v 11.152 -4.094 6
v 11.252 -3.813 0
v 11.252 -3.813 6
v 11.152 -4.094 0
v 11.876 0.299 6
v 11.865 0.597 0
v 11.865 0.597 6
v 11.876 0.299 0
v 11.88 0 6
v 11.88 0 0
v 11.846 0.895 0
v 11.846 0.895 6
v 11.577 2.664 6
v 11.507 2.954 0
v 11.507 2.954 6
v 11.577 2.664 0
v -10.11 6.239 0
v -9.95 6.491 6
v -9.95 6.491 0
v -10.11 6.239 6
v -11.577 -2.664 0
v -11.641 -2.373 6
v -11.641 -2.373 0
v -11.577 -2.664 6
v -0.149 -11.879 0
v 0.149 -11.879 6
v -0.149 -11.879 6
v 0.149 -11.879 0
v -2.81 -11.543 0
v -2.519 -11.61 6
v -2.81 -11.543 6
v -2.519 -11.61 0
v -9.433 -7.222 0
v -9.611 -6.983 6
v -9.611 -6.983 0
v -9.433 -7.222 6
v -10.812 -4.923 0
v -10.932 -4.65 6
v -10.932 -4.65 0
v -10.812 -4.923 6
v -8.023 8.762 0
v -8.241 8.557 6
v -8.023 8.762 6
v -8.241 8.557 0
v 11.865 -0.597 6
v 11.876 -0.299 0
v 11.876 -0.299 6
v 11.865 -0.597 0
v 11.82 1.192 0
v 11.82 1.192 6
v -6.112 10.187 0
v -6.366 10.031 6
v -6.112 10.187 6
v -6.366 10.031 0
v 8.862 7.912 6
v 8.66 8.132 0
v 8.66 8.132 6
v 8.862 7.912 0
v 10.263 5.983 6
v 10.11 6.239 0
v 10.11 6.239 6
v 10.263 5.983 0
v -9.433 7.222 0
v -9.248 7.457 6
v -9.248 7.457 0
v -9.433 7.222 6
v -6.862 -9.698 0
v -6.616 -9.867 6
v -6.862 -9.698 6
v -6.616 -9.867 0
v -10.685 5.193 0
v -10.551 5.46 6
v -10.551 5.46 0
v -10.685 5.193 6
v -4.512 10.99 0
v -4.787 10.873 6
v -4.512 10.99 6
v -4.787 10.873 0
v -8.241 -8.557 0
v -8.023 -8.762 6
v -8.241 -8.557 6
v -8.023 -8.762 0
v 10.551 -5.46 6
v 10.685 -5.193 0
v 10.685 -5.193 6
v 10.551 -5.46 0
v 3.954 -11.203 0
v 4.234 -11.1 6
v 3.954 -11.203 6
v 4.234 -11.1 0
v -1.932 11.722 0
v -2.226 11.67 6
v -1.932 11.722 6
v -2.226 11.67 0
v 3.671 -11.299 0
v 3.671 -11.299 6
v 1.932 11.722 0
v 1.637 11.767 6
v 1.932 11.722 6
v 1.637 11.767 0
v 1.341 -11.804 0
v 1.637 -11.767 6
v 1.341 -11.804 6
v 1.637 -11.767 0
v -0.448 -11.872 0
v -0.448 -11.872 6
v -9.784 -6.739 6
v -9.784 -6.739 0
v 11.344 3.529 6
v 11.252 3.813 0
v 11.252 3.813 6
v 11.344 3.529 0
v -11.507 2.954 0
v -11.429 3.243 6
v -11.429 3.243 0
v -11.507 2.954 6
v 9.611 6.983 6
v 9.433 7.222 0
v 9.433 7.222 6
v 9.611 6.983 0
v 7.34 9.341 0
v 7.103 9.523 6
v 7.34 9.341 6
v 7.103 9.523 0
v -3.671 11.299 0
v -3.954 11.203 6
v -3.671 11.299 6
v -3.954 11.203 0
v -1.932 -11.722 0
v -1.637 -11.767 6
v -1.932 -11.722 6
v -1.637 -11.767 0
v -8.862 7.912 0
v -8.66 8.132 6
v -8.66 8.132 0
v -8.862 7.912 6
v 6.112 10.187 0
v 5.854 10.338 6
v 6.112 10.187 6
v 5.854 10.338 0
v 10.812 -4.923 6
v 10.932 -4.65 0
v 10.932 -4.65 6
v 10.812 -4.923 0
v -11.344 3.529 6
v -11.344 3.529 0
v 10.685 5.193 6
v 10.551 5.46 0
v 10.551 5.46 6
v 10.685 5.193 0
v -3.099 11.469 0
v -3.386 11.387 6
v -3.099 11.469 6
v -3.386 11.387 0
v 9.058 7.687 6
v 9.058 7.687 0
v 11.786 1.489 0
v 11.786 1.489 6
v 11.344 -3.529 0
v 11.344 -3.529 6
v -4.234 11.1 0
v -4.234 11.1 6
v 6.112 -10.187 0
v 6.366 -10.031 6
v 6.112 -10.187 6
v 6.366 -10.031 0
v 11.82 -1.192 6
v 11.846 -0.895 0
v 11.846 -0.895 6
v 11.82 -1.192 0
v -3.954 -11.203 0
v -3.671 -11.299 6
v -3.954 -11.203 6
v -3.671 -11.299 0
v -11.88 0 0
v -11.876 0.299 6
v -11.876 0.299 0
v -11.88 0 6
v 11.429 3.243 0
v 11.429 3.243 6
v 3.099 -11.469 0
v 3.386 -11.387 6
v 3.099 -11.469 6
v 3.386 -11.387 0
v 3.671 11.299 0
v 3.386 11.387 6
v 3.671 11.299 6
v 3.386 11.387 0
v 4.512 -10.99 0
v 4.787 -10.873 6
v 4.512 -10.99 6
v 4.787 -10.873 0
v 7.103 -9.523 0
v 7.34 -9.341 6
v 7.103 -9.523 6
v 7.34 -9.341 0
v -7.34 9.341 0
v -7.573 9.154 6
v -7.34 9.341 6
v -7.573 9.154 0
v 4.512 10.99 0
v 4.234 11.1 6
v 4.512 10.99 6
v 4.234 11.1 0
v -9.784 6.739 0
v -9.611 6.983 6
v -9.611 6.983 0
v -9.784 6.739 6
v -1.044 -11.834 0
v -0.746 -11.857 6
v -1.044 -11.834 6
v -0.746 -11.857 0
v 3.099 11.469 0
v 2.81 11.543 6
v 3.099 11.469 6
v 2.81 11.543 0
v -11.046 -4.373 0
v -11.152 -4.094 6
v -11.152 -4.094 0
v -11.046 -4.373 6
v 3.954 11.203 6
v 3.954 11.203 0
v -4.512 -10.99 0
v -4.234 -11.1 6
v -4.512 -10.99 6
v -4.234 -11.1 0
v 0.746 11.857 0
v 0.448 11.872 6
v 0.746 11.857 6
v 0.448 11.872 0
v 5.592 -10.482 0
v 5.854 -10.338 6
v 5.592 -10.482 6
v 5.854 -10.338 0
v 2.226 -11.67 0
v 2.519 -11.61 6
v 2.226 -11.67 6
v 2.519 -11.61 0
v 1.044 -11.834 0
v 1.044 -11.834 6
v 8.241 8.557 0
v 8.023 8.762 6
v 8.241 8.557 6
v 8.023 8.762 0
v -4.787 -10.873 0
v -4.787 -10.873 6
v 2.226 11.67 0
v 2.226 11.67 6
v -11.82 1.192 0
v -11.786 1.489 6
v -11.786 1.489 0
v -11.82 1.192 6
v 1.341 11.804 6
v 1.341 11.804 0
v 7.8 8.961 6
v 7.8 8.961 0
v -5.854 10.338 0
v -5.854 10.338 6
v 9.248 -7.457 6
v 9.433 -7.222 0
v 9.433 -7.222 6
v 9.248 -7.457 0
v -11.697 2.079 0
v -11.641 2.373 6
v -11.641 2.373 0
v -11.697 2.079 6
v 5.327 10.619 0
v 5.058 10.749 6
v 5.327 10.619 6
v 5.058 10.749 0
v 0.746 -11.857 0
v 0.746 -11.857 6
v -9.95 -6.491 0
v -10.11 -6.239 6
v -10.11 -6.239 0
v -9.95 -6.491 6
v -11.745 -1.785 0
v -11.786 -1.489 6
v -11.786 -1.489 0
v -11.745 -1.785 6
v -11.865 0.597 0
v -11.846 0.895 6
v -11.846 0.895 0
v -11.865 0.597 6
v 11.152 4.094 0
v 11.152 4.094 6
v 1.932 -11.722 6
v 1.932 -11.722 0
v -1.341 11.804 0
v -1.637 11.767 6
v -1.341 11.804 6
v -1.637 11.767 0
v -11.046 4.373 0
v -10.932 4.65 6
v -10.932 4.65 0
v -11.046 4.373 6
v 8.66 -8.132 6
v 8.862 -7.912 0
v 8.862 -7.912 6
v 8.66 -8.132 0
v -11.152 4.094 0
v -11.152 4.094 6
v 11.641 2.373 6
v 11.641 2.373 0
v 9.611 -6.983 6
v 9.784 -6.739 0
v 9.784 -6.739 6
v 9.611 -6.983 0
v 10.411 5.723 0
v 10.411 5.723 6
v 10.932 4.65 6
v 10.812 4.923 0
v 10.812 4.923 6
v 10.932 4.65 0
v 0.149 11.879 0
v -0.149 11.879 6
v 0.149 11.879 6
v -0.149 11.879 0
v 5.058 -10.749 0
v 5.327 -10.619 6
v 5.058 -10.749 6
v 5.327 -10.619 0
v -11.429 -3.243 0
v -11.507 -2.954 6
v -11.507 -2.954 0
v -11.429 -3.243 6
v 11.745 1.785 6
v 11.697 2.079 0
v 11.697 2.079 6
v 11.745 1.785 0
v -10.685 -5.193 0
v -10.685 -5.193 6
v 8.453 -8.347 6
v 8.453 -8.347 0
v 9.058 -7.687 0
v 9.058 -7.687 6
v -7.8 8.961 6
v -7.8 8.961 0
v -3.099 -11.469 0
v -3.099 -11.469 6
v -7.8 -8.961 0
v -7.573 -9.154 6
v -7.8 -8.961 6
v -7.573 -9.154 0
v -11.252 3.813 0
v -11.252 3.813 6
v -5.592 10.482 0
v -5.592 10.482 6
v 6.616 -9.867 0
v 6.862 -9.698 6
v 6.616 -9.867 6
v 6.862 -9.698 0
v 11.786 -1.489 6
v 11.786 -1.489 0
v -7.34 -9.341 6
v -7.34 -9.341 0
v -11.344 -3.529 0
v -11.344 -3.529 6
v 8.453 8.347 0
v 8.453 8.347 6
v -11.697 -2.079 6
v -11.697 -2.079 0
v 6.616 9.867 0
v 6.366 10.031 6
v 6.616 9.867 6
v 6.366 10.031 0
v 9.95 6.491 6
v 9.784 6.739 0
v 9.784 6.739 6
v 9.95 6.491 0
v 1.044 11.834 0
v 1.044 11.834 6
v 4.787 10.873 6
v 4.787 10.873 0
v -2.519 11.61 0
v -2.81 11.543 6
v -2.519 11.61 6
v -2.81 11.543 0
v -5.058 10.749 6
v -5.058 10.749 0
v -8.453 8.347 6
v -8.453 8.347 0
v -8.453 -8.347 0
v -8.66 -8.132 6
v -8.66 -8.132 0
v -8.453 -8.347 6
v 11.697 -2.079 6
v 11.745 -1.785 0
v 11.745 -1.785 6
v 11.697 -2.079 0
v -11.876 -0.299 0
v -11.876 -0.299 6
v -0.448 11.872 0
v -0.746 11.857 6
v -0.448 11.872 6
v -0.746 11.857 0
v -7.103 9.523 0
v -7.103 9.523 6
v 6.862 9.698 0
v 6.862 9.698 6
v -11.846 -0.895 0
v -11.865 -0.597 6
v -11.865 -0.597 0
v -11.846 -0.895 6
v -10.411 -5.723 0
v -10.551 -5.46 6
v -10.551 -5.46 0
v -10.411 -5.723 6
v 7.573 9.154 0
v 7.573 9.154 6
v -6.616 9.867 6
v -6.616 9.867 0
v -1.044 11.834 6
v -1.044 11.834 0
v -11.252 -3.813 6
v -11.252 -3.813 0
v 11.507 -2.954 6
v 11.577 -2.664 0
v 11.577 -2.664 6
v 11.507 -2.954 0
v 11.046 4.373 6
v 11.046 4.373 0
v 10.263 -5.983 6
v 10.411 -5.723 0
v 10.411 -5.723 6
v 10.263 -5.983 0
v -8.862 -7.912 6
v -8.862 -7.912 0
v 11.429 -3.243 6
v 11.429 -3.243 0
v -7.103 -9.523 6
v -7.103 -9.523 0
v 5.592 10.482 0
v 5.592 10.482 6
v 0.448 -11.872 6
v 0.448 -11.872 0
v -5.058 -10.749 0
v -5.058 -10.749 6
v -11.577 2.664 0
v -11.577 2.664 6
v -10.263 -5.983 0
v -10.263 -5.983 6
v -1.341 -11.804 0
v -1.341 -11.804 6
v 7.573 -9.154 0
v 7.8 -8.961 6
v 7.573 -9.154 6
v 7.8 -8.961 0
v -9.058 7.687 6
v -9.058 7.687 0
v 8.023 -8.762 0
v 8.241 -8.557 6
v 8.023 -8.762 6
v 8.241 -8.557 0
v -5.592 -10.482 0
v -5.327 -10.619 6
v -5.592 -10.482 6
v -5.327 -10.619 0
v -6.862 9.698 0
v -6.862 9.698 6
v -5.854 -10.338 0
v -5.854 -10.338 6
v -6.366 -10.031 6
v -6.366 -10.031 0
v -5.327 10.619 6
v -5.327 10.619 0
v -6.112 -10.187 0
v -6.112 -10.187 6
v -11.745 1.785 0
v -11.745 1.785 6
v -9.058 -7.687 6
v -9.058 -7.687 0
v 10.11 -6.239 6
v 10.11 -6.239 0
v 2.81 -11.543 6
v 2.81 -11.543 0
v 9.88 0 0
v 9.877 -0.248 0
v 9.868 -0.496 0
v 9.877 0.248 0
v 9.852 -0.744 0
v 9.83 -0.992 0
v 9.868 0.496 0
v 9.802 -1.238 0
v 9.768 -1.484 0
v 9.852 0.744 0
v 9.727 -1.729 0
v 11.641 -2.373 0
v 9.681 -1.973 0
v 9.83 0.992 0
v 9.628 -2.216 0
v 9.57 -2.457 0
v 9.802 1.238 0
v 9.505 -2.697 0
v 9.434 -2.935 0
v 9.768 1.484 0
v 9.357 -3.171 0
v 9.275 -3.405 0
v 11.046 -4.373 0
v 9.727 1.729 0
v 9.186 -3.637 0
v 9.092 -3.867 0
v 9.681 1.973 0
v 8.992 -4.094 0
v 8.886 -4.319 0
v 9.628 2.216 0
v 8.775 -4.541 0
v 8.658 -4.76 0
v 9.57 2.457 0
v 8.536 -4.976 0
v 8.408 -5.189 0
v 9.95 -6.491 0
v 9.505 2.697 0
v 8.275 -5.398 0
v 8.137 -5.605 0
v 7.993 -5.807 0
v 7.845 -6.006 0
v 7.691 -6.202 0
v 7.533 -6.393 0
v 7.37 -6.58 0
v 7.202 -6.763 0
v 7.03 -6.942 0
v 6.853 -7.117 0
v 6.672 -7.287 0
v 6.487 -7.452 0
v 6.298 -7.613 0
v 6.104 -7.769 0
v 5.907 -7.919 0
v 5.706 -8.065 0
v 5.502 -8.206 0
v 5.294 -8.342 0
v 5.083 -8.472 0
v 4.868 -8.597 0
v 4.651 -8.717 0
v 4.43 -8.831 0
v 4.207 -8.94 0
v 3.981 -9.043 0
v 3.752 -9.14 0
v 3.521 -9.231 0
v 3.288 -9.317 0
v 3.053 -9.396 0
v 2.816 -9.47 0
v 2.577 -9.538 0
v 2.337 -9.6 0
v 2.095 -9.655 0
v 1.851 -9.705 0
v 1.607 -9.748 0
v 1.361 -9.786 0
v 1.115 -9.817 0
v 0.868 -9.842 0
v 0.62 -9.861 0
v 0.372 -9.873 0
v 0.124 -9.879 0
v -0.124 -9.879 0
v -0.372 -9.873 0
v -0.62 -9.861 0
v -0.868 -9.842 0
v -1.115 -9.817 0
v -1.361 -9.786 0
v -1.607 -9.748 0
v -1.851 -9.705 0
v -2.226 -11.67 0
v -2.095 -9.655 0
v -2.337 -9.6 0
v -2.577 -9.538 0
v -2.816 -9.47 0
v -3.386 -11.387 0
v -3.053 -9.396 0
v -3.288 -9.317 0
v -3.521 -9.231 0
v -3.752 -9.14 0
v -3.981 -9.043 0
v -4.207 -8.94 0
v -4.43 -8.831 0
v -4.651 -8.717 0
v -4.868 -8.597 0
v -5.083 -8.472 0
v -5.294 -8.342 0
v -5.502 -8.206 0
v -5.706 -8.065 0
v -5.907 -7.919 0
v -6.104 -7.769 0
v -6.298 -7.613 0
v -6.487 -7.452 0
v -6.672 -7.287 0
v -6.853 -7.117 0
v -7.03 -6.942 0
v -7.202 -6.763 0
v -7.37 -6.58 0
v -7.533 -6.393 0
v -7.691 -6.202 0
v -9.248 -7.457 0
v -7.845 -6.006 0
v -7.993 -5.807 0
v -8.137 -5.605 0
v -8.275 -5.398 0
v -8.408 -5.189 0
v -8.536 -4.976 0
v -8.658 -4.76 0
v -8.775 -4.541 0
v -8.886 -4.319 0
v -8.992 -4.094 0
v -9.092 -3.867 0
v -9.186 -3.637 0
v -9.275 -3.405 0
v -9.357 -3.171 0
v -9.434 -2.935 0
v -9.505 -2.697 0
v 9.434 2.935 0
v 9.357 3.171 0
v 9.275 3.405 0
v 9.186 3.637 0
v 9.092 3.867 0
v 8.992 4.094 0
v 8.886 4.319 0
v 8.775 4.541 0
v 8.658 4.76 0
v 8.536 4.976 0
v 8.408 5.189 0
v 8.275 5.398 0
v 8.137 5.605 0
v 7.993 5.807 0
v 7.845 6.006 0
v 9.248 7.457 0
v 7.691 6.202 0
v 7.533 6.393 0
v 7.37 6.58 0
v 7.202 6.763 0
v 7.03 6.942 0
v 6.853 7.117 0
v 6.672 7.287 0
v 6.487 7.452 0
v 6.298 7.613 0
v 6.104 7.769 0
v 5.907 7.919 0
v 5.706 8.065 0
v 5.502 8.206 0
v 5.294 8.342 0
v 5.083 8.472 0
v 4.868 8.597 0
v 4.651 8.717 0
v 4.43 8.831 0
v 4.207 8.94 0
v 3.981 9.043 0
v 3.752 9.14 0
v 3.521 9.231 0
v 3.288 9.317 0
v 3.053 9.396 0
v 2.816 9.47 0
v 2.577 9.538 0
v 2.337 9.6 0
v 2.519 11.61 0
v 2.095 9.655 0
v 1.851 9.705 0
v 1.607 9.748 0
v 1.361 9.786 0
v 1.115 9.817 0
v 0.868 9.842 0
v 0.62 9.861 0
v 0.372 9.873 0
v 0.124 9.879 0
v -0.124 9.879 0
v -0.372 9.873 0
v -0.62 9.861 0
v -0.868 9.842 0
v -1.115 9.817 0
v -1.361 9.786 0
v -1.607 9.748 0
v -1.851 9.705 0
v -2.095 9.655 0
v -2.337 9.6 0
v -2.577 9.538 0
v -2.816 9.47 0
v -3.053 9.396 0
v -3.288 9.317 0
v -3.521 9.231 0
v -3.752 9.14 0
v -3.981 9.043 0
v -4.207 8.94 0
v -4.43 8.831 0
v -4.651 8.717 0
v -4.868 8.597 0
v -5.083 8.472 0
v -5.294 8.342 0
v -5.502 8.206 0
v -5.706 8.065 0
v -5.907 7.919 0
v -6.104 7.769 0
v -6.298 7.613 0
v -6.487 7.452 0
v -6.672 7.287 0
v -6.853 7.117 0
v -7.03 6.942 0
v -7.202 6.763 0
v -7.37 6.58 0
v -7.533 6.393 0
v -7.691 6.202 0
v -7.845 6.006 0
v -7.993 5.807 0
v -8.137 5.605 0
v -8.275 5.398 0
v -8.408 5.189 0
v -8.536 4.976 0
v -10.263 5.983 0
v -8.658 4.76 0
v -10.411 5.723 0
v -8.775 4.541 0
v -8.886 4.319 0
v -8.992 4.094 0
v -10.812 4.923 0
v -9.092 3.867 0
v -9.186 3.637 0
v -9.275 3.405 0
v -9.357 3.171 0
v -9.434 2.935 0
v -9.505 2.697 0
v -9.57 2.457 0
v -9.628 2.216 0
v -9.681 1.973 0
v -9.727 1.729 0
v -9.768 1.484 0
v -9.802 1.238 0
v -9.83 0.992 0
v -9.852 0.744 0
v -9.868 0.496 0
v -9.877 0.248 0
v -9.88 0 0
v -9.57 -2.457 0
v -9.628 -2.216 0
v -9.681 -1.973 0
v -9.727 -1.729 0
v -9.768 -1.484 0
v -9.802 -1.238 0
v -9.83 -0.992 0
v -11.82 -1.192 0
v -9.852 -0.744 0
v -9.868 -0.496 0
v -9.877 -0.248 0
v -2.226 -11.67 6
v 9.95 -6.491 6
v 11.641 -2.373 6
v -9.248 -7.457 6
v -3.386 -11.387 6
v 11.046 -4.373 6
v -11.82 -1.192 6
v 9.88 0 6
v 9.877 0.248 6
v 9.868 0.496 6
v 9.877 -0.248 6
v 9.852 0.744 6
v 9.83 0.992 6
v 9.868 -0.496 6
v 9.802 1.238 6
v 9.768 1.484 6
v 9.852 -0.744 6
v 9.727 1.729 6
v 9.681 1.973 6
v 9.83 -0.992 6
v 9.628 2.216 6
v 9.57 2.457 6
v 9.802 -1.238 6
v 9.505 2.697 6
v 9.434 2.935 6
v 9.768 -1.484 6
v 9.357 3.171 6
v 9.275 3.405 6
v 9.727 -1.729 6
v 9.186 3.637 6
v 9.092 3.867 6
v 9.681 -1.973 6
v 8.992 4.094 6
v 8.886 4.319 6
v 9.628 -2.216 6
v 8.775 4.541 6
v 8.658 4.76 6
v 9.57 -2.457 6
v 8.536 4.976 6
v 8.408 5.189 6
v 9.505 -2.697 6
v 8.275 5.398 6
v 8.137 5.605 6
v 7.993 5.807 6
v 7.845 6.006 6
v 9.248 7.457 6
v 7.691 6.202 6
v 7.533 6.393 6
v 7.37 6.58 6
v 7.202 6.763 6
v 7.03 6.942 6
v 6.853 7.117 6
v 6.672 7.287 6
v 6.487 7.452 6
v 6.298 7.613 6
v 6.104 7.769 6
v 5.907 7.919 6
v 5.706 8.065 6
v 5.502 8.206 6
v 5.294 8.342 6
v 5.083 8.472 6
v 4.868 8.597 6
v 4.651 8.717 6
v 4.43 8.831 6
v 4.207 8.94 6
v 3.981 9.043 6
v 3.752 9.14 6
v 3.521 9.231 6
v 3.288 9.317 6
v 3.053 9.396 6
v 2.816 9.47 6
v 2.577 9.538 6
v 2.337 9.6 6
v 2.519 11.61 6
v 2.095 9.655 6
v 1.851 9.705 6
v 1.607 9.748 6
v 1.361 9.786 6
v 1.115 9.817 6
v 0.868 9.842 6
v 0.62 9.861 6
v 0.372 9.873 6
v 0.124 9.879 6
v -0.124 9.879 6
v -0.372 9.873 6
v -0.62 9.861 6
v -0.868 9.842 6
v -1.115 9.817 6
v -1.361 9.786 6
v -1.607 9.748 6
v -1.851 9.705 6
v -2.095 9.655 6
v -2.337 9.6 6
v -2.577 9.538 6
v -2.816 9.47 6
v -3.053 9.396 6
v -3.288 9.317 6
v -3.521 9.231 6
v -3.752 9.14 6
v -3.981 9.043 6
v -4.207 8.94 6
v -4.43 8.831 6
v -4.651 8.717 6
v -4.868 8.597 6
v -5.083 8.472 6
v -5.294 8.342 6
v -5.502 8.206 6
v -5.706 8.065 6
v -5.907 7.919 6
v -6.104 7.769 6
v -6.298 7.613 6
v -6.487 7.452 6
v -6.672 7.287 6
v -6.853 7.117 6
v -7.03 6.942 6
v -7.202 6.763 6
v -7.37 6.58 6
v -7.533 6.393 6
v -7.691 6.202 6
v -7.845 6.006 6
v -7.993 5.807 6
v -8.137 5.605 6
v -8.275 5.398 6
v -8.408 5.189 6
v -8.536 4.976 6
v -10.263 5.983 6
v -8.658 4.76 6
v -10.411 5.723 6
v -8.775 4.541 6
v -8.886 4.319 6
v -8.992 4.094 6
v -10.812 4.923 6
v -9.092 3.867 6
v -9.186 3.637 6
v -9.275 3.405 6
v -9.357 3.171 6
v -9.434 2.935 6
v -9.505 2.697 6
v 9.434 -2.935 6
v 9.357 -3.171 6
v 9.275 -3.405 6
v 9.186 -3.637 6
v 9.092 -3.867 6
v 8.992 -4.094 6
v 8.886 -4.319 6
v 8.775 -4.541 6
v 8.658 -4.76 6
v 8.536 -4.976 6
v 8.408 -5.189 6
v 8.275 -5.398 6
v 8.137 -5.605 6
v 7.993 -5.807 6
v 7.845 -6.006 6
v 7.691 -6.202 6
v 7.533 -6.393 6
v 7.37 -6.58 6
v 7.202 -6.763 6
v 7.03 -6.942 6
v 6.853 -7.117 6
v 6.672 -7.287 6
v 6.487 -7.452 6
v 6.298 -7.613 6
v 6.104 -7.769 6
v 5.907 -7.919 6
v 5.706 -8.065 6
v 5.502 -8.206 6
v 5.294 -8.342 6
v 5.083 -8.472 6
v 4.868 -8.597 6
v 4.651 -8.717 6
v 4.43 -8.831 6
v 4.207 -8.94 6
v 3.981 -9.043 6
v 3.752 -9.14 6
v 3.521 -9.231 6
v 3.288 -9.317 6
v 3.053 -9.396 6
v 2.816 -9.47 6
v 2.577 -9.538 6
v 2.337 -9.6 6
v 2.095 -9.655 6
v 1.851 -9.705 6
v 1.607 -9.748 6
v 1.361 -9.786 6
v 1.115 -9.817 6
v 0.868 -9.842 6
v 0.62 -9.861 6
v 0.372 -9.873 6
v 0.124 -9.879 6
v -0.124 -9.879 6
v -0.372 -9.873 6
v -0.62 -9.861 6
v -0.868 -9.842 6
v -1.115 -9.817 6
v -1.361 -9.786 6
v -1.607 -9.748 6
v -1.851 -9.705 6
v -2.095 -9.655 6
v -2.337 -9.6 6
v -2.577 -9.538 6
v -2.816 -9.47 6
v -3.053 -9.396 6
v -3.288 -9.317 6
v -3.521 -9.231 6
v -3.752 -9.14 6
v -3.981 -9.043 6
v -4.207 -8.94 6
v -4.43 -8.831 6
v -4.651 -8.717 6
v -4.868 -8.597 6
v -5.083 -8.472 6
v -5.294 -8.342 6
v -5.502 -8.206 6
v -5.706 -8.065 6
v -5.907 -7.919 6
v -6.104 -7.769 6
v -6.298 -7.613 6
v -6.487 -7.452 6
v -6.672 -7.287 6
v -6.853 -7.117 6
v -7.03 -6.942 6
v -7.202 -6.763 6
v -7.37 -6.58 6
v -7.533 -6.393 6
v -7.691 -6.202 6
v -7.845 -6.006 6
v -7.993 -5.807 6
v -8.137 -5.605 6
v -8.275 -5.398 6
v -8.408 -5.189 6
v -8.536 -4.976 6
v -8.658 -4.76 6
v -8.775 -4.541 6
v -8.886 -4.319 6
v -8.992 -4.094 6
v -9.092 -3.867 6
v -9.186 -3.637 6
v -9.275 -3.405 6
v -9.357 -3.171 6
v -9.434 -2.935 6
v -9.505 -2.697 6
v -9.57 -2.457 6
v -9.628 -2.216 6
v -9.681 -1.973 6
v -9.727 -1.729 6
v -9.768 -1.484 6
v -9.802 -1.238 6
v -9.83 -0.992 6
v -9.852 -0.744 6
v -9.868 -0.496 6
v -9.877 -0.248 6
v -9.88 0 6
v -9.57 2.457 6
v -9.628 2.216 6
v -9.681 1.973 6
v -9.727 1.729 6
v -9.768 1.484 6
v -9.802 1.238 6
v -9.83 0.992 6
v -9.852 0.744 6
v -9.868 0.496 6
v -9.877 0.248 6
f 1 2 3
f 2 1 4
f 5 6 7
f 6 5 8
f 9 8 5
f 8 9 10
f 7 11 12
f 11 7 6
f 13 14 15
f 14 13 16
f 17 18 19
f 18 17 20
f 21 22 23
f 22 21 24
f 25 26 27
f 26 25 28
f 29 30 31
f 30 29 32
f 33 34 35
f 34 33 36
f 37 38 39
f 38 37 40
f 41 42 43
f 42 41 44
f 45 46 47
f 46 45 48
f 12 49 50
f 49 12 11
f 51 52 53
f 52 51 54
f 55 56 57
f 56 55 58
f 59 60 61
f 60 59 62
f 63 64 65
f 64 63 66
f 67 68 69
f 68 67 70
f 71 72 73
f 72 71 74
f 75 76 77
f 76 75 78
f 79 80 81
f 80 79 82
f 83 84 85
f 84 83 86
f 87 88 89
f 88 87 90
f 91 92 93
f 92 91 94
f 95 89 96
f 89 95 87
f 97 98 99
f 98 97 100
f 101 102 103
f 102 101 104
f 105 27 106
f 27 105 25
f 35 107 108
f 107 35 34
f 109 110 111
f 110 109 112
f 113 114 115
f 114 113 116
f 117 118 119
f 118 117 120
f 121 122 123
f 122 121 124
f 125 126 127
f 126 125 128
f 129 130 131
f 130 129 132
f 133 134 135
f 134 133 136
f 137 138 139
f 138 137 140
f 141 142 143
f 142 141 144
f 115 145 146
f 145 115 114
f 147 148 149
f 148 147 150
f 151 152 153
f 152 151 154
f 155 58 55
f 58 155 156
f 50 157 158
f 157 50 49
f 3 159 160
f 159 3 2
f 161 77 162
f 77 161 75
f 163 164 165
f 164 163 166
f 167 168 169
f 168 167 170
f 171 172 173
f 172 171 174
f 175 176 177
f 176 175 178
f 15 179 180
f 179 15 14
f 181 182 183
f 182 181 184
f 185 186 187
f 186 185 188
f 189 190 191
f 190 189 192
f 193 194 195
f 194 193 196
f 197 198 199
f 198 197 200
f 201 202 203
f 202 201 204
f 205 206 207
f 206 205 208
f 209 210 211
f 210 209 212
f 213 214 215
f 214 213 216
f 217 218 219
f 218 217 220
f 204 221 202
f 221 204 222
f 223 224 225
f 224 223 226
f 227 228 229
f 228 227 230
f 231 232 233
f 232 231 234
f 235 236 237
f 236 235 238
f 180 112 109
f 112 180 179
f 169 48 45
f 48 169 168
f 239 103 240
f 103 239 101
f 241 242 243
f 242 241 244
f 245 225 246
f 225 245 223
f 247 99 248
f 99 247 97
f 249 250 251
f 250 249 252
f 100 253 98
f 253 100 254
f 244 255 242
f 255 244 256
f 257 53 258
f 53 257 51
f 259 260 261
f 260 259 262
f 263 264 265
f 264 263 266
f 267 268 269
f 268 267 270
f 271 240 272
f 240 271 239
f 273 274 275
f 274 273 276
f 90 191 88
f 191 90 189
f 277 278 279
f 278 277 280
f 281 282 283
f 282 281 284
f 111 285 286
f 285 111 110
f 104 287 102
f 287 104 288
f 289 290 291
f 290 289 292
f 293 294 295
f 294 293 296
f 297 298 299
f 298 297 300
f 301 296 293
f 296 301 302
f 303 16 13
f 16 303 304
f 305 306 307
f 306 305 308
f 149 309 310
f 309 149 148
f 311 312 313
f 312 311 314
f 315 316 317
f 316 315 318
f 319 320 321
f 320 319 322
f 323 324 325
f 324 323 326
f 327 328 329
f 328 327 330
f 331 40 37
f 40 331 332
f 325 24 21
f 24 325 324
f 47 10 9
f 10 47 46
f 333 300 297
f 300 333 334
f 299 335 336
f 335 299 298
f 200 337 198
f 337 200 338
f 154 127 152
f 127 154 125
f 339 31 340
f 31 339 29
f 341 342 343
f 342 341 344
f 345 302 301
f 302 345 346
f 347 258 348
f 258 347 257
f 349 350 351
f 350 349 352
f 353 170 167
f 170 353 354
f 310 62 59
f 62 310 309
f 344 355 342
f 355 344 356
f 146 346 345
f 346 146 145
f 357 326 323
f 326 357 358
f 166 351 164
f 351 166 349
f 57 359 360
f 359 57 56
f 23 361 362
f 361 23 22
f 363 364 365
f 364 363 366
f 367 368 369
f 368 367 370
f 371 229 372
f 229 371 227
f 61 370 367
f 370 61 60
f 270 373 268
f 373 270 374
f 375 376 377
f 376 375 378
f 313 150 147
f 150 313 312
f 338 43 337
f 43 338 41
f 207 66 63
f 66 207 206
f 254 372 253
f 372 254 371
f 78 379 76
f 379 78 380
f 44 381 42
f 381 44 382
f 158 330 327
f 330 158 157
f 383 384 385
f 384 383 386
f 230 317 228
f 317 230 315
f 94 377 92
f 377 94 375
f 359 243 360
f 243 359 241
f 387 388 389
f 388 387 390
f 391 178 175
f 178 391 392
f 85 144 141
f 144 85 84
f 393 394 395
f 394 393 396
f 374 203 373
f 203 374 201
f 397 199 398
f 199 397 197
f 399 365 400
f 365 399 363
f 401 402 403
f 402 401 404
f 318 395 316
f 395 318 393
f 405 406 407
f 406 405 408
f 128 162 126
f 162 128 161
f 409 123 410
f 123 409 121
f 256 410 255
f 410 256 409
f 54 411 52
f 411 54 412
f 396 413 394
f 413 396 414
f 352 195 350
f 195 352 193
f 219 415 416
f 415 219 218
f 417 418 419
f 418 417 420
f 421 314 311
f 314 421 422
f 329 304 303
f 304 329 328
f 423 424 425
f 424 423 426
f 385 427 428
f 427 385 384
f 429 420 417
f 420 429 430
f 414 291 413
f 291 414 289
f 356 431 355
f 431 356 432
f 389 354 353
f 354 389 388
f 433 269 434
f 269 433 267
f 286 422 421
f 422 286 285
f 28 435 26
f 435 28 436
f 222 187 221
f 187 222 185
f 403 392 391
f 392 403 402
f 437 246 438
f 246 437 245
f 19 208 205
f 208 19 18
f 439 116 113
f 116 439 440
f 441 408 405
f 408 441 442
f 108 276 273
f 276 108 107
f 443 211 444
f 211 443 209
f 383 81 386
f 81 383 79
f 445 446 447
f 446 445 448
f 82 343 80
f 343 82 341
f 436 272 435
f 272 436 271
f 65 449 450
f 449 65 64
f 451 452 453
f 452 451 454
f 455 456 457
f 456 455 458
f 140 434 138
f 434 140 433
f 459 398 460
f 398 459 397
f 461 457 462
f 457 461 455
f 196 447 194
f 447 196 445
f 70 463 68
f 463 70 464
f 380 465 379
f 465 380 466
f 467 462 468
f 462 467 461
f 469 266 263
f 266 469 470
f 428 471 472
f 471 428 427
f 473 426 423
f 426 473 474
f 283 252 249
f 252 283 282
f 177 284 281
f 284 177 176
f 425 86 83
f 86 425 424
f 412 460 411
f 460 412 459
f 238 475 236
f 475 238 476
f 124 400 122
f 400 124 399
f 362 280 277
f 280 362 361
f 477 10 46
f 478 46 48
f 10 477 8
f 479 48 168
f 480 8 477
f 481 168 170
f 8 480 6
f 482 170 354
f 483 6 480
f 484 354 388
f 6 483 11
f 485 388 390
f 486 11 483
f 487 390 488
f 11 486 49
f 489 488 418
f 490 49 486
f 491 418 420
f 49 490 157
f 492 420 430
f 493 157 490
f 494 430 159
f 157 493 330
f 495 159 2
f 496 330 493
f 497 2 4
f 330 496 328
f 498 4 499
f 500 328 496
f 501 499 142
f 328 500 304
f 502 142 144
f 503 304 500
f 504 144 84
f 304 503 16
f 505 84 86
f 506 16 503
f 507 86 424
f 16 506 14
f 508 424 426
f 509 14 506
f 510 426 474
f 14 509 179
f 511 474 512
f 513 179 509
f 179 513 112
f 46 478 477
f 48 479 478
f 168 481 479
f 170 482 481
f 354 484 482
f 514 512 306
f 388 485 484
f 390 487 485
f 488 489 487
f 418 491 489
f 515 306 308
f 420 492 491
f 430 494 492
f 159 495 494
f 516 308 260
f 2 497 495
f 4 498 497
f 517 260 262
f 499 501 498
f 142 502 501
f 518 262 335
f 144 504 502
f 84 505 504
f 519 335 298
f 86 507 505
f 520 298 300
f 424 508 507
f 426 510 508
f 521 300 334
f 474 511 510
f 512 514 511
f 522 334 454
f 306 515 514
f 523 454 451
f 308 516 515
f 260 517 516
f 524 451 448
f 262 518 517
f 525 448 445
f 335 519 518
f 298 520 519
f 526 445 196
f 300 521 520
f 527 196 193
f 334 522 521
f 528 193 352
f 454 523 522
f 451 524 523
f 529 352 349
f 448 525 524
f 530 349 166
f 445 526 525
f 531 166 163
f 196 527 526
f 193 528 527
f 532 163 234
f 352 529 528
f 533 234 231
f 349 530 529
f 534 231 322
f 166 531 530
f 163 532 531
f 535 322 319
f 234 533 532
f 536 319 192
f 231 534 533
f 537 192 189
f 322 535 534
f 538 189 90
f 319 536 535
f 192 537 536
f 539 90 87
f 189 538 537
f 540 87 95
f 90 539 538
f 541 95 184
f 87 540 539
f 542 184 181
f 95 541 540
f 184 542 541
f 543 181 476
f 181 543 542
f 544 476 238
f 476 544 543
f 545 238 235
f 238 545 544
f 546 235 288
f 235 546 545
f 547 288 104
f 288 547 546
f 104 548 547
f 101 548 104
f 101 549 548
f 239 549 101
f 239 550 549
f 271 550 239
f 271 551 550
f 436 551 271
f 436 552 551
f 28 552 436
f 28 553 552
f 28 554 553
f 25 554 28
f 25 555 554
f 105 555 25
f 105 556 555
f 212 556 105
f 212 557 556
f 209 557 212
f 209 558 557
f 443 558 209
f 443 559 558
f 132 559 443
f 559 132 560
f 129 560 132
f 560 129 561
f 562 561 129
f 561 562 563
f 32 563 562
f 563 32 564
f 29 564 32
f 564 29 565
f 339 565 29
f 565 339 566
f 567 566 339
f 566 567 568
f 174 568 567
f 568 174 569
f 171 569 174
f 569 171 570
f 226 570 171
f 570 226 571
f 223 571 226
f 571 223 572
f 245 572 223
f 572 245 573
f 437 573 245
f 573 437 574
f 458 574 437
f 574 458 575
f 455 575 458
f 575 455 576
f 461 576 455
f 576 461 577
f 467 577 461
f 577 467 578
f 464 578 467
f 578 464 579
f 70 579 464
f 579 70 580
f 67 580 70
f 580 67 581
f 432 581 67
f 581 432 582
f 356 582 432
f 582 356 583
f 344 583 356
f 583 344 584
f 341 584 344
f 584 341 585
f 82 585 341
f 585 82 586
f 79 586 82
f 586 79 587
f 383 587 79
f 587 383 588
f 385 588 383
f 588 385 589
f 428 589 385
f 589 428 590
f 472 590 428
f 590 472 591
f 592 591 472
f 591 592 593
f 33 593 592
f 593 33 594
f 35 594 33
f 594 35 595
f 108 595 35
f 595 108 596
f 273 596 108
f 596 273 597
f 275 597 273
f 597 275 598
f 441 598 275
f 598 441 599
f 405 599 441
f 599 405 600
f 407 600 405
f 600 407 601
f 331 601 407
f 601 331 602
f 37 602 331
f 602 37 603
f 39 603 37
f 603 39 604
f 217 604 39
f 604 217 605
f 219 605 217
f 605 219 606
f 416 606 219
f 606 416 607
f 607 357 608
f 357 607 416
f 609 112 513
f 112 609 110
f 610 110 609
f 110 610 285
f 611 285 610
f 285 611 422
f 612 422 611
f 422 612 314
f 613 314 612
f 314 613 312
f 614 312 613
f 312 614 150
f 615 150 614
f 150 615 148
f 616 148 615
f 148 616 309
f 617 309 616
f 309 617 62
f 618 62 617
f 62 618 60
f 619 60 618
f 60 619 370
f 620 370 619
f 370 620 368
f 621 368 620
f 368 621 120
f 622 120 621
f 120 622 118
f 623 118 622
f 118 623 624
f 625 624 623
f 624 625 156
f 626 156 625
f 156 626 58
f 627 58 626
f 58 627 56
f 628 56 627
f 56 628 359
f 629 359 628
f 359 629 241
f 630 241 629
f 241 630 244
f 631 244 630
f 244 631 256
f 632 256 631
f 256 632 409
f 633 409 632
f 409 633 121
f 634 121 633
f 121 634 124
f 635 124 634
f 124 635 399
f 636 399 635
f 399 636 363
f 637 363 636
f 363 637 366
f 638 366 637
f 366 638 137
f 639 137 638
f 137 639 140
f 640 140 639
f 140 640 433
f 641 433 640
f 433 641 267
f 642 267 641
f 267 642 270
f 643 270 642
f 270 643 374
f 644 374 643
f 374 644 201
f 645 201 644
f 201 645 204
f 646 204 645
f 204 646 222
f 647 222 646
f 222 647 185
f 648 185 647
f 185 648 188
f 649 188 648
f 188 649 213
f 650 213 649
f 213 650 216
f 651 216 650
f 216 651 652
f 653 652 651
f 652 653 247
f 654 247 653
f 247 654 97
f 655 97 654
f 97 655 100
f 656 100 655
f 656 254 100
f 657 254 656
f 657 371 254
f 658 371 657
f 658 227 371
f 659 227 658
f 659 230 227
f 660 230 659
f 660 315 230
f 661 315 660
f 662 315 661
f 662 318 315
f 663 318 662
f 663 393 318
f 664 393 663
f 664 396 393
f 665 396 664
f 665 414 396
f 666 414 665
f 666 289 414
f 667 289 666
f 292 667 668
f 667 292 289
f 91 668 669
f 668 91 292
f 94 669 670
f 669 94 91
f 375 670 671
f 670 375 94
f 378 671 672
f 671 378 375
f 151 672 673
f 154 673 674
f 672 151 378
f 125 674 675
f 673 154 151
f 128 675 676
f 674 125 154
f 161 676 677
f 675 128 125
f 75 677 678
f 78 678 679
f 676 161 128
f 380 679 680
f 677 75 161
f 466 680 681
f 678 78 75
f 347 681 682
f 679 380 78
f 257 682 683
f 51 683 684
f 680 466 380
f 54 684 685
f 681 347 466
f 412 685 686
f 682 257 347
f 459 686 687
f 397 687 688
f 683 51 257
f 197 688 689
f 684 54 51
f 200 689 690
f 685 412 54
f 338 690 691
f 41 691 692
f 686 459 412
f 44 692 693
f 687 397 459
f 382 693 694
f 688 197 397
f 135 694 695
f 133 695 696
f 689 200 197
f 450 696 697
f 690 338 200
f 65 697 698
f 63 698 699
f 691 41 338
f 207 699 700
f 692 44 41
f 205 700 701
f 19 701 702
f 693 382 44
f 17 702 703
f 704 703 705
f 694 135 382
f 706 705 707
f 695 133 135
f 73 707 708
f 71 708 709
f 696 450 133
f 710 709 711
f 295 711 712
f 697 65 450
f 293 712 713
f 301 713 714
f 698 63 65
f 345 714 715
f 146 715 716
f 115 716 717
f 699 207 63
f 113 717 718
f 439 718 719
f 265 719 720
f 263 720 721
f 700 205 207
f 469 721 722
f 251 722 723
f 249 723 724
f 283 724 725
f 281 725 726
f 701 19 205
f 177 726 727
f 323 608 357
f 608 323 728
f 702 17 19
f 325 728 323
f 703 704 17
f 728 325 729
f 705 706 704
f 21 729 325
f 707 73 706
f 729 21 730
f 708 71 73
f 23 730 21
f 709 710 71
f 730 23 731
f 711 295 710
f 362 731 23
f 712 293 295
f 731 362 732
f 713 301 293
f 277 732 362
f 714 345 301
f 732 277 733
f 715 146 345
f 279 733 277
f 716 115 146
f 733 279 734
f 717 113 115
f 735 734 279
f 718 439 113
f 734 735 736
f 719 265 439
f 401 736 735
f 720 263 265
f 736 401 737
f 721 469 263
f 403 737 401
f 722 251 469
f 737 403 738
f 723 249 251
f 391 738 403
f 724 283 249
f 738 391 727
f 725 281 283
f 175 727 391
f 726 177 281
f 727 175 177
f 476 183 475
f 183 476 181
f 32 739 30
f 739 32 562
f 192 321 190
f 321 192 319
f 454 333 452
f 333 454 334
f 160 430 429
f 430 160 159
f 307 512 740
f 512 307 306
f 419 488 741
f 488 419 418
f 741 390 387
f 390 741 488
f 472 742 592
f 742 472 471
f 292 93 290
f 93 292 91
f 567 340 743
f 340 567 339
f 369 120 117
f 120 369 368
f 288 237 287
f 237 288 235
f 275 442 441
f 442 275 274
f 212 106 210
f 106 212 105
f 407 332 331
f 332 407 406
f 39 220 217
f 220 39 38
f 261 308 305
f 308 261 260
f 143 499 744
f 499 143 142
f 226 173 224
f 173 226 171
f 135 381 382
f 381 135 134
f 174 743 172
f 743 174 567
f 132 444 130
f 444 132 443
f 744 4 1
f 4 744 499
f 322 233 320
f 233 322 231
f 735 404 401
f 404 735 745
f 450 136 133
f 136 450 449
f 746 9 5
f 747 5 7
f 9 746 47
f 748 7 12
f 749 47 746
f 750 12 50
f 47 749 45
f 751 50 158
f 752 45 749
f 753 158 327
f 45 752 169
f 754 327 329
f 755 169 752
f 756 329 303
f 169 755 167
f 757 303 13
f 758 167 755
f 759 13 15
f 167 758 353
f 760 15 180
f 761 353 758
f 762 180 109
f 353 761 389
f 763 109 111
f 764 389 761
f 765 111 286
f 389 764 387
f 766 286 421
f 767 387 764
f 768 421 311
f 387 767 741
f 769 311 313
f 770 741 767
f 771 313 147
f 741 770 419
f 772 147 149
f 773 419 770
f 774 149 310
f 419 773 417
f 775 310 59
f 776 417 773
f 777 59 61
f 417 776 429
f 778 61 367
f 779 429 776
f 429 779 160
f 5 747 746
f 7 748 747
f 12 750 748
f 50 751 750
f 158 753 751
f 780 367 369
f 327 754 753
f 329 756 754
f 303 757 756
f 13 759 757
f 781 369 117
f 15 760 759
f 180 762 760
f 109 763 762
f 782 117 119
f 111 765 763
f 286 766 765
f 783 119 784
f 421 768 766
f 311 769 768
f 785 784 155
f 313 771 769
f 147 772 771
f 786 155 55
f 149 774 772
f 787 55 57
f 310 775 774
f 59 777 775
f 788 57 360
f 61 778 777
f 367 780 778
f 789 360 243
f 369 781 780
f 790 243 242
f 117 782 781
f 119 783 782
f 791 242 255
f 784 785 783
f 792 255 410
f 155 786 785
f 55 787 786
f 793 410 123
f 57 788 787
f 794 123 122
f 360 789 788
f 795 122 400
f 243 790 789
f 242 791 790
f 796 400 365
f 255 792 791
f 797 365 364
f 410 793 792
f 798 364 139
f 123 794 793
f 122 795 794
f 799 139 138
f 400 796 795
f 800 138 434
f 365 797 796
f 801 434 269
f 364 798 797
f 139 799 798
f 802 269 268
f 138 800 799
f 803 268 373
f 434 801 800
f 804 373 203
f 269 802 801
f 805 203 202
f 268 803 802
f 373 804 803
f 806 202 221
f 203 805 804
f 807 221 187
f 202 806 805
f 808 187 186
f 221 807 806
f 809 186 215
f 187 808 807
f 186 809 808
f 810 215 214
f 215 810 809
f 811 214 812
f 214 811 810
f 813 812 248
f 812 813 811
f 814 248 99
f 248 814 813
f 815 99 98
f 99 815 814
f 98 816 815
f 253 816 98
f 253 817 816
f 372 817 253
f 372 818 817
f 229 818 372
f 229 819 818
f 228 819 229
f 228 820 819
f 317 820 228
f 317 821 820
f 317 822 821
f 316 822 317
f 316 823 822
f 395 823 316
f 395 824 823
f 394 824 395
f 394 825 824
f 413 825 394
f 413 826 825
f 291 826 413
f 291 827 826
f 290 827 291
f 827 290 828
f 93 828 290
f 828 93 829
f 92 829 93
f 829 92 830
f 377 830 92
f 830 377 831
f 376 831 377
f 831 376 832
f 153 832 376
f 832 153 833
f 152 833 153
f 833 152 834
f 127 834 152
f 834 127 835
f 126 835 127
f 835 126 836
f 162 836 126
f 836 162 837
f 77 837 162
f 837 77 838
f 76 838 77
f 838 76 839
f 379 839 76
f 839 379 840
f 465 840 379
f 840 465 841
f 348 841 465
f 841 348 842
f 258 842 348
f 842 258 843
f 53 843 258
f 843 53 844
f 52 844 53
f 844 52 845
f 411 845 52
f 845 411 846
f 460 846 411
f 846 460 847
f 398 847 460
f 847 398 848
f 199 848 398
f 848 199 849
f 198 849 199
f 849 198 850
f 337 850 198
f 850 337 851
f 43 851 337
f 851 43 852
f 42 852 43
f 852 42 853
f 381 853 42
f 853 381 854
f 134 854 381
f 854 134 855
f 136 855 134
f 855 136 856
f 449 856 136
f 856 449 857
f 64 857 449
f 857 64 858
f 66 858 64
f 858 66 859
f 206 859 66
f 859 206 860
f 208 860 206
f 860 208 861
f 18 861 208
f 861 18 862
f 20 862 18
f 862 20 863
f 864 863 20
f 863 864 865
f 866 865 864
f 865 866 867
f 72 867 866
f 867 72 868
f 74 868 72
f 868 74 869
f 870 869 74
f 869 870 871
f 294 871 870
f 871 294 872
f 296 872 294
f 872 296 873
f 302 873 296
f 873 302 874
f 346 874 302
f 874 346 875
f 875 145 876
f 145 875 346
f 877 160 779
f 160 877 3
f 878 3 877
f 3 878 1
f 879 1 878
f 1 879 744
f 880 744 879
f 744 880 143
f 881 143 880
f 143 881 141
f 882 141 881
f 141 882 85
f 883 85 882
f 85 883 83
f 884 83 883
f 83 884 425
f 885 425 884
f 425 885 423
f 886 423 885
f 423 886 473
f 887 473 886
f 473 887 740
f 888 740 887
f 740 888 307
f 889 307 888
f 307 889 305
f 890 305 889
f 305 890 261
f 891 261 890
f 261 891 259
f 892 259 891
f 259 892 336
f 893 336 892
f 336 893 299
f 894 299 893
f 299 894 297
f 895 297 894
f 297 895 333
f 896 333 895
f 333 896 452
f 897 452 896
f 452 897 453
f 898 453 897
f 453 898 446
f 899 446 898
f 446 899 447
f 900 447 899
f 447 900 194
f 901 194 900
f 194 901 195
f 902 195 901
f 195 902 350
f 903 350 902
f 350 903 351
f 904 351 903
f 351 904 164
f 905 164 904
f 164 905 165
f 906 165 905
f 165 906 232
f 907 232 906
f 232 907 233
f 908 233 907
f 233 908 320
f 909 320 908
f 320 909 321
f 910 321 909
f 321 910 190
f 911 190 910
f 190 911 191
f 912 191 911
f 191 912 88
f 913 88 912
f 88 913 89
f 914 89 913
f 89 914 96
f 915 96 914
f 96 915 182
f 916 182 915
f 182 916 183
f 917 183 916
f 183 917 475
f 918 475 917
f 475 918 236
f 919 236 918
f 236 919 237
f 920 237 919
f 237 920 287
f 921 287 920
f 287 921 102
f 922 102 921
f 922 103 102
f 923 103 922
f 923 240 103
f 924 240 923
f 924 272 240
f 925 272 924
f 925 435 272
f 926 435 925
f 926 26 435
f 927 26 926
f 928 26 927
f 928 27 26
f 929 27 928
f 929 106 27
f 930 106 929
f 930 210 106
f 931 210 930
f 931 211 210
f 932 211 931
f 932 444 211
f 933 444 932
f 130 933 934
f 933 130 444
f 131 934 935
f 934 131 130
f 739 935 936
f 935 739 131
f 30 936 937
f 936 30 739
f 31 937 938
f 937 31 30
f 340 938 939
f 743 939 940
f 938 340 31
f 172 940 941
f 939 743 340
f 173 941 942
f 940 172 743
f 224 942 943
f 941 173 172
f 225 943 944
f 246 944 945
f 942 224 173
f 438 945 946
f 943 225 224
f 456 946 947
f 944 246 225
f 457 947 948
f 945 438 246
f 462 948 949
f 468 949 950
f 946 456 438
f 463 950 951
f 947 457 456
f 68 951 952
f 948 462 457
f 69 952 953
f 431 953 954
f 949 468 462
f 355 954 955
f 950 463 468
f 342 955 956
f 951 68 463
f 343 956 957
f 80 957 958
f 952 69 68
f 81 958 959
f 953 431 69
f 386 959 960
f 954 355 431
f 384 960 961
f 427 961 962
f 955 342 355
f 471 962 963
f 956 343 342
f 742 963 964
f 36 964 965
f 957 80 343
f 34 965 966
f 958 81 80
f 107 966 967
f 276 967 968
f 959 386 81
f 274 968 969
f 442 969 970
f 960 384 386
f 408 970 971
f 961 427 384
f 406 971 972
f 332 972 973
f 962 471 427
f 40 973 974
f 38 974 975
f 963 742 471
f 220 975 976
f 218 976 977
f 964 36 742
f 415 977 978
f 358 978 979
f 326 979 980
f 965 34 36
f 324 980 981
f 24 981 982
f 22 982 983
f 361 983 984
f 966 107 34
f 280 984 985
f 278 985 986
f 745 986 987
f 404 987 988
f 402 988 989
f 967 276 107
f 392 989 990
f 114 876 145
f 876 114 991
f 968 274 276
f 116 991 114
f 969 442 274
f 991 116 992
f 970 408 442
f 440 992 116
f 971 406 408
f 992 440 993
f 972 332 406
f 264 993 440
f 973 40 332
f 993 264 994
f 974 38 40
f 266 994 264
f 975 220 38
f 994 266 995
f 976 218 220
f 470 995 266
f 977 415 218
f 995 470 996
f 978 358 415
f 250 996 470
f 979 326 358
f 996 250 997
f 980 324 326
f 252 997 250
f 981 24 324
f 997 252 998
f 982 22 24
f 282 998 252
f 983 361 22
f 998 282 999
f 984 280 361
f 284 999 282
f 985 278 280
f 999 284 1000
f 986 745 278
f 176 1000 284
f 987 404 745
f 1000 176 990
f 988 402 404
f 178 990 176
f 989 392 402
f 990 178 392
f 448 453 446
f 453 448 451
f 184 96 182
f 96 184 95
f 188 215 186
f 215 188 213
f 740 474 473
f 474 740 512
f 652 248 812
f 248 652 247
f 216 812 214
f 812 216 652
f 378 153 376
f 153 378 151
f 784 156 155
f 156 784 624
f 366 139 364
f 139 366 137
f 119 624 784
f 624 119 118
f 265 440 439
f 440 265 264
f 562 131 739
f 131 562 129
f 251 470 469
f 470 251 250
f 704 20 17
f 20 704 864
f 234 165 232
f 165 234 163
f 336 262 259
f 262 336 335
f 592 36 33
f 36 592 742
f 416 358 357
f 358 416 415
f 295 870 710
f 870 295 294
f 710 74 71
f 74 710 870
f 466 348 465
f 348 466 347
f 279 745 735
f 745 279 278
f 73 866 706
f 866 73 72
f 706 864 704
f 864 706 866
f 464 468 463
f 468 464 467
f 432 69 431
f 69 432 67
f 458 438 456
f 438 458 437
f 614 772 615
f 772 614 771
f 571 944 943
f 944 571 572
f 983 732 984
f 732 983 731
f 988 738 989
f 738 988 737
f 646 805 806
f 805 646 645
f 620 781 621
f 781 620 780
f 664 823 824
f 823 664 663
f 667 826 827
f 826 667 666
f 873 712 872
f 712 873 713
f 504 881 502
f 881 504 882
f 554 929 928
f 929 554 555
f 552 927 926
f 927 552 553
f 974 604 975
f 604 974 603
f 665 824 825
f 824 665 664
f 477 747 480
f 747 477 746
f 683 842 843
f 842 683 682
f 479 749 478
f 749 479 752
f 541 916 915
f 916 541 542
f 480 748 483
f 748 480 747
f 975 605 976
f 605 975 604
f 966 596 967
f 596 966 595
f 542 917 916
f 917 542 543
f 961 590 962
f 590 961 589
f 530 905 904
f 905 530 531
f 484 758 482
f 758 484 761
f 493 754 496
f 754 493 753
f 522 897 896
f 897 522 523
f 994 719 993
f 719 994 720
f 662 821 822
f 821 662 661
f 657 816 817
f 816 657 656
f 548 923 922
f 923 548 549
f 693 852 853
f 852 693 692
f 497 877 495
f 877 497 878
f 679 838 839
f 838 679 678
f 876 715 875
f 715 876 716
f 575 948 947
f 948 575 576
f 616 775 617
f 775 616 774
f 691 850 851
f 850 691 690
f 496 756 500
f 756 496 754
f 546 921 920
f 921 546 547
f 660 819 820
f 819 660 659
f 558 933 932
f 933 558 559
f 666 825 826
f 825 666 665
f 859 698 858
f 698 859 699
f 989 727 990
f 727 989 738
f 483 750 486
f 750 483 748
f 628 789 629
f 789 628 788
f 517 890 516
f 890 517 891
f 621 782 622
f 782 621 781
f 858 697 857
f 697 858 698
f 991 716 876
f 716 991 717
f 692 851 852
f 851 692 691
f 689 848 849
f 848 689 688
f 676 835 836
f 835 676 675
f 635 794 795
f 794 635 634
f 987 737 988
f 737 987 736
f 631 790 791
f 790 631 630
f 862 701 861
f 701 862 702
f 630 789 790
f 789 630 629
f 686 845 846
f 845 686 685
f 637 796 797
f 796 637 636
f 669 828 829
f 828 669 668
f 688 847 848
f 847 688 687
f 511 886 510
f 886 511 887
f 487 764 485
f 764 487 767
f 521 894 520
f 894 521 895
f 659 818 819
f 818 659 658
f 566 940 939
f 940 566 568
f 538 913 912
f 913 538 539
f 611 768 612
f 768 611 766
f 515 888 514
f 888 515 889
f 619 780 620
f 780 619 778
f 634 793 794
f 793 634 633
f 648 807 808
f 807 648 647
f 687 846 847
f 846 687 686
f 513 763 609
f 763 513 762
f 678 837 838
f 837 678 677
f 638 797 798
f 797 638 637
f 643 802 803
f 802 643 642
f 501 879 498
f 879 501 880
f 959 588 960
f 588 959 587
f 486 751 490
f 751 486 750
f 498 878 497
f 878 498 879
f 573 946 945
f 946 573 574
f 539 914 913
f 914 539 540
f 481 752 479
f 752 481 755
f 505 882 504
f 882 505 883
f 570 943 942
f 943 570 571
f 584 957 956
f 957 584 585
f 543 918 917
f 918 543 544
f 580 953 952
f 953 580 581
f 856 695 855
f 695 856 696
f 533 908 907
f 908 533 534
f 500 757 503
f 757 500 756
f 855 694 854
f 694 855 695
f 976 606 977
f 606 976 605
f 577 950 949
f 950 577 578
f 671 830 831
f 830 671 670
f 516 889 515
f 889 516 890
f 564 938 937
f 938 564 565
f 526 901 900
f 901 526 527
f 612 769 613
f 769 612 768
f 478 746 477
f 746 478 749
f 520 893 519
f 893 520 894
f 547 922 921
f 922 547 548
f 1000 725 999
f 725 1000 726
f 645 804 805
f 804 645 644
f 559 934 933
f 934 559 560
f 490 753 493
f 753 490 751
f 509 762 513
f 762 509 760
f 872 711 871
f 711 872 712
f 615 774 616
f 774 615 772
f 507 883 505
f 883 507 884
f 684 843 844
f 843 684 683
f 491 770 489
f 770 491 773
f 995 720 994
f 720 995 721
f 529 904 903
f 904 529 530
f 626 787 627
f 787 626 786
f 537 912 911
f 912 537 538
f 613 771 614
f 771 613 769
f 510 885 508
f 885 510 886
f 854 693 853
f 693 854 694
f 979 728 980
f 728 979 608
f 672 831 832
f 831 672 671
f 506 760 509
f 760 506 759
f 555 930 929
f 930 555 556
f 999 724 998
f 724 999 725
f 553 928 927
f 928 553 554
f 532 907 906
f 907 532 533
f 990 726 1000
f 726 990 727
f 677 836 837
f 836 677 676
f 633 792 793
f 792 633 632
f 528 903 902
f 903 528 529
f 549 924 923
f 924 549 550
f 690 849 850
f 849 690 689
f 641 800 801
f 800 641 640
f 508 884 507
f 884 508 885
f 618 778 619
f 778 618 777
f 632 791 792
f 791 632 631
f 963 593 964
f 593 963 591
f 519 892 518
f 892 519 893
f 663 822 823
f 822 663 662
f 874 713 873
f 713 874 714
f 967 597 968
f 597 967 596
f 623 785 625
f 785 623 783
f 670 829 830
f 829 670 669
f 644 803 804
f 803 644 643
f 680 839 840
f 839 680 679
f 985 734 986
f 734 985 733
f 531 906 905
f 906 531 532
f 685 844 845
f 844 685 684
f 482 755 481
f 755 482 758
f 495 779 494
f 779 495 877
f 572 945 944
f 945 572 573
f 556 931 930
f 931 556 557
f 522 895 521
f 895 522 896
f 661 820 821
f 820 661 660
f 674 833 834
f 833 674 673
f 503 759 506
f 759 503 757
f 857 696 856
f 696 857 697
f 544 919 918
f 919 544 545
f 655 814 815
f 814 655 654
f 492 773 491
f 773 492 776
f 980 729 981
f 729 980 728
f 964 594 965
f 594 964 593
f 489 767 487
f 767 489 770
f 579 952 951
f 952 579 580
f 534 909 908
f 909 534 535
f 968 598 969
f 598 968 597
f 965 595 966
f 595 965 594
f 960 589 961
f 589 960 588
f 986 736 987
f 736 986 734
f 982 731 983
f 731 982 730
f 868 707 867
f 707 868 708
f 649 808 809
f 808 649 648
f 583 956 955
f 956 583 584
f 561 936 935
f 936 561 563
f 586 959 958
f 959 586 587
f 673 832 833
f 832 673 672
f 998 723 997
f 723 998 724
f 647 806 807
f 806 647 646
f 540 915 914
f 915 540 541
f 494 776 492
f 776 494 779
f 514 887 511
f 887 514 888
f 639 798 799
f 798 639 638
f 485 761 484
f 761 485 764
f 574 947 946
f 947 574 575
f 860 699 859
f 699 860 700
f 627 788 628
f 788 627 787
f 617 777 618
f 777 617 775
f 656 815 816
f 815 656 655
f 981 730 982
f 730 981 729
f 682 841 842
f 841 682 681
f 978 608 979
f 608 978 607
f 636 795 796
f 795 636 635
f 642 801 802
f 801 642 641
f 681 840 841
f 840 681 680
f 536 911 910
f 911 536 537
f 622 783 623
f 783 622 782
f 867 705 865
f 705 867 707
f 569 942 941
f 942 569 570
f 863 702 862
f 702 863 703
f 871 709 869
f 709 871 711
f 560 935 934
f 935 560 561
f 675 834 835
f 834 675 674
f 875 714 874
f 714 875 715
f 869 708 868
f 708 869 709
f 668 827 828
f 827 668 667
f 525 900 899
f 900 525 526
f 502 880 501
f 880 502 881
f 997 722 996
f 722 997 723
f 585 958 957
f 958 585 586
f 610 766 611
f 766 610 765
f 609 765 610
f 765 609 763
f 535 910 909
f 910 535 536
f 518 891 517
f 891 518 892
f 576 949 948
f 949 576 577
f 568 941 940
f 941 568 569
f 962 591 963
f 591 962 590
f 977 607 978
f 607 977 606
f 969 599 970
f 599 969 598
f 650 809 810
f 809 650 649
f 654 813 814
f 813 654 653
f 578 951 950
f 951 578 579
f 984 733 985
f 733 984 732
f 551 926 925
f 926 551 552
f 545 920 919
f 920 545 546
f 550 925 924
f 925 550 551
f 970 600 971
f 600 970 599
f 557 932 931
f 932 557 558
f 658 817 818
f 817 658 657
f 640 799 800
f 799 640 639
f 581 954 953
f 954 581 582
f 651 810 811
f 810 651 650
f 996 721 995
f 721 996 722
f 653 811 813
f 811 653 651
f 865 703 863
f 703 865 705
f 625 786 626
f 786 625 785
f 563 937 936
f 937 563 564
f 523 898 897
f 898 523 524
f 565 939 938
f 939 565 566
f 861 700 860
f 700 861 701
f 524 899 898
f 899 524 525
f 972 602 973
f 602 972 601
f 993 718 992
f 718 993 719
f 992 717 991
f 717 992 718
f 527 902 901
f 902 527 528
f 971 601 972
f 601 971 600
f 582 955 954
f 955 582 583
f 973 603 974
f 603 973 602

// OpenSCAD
// CUSTOMIZER VARIABLES
// GREP pattern for CSV spreadsheet: (.*),(.*),(.*)\r     ->     \1\:\\2 US \/ \3 UK\, 

// Ring Size
ring_size = 19.76; // [  9.91:000 US, 10.72:00 US, 11.63:0 US, 11.84:0.25 US, 12.04:0.5 US / A UK, 12.24:0.75 US / A.5 UK, 12.45:1 US / B UK, 12.65:1.25 US / B.5 UK, 12.85:1.5 US / C UK, 13.06:1.75 US / C.5 UK, 13.26:2 US / D UK, 13.46:2.25 US / D.5 UK, 13.67:2.5 US / E UK, 13.87:2.75 US / E.5 UK, 14.07:3 US / F UK, 14.27:3.25 US / F.5 UK, 14.48:3.5 US / G UK, 14.68:3.75 US / G.5 UK, 14.88:4 US / H UK, 15.09:4.25 US / H.5 UK, 15.29:4.5 US / I UK, 15.49:4.75 US / J UK, 15.7:5 US / J.5 UK, 15.9:5.25 US / K UK, 16.1:5.5 US / K.5 UK, 16.31:5.75 US / L UK, 16.51:6 US / L.5 UK, 16.71:6.25 US / M UK, 16.92:6.5 US / M.5 UK, 17.12:6.75 US / N UK, 17.32:7 US / N.5 UK, 17.53:7.25 US / O UK, 17.73:7.5 US / O.5 UK, 17.93:7.75 US / P UK, 18.14:8 US / P.5 UK, 18.34:8.25 US / Q UK, 18.54:8.5 US / Q.5 UK, 18.75:8.75 US / R UK, 18.95:9 US / R.5 UK, 19.15:9.25 US / S UK, 19.35:9.5 US / S.5 UK, 19.56:9.75 US / T UK, 19.76:10 US / T.5 UK, 19.96:10.25 US / U UK, 20.17:10.5 US / U.5 UK, 20.37:10.75 US / V UK, 20.57:11 US / V.5 UK, 20.78:11.25 US / W UK, 20.98:11.5 US / W.5 UK, 21.18:11.75 US / X UK, 21.39:12 US / X.5 UK, 21.59:12.25 US / Y UK, 21.79:12.5 US / Z UK, 22:12.75 US / Z.5 UK, 22.19:13 US, 22.4:13.25 US / Z1 UK, 22.61:13.5 US / Z2 UK, 22.81:13.75 US, 23.01:14 US / Z3 UK, 23.22:14.25 US, 23.42:14.5 US / Z4 UK, 23.62:14.75 US, 23.83:15 US / Z5 UK, 24.03:15.25 US, 24.23:15.5 US / Z6 UK, 24.43:15.75 US, 24.64:16 US / Z7 UK, 25.02:16.5 US / Z8 UK, 25.43:17 US / Z9 UK, 25.85:17.5 US, 26.26:18 US, 26.64:18.5 US, 27.06:19 US, 27.47:19.5 US, 27.88:20 US ]

// Ring Thickness, in mm
ring_thickness = 2.0;   // [1.0:0.1:20]

// Ring Height, in mm
ring_height = 6.0;    // [1.0:0.1:30]

// Quality/Polygons
quality = 250;  // [ 50:Draft, 100:Low, 250:Medium, 600:High, 1500:Extreme, 4000:Insane ]

// Edge Style
edge_style = 0;     // [0:Square, 1:Round, 2:Triangle, 3:Hex, 4:Extended Square, 5:Extended Round ]

// Extended Edge Thickness, in mm
extended_thickness = 0.3;       // [0.1:0.1:10]

// Extended Edge Height, in mm
extended_height = 0.8;    // [0.1:0.1:10]

//CUSTOMIZER VARIABLES END


// TODO - edge styles: rope


translate([0, 0, ring_height/2])
    ring();


module ring() {
	
    inside_radius = ring_size / 2;
    outside_radius = inside_radius + ring_thickness;
    extended_radius = outside_radius + extended_thickness;
    
    rounding_diameter = ring_thickness;
    rounding_radius = rounding_diameter / 2;
    
    cyl_height = ring_height - ((edge_style != 0 && edge_style < 4) ? 2*rounding_radius: 0);
    

    difference() {
        union() {
            cylinder( cyl_height, outside_radius, outside_radius, $fn = quality, center = true );
            
            // Extended Square
            if (edge_style == 4) {
               translate([0, 0, (cyl_height-extended_height)/2])
                  cylinder( extended_height, extended_radius, extended_radius, $fn = quality, center = true );
        
                translate([0, 0, -(cyl_height-extended_height)/2])
                  cylinder( extended_height, extended_radius, extended_radius, $fn = quality, center = true );
            }
            
            // Extended Round
            if (edge_style == 5) {
                translate([0, 0, (cyl_height-extended_height)/2])
                  rotate_extrude(convexity = 10, $fn = quality)
                    translate([inside_radius+ring_thickness, 0, 0])
                      scale([1,(extended_height/(extended_thickness*2)),1])    // scale on Y to get height
                        circle(r = extended_thickness, $fn = quality/5);
        
                translate([0, 0, -(cyl_height-extended_height)/2])
                  rotate_extrude(convexity = 10, $fn = quality)
                    translate([inside_radius+ring_thickness, 0, 0])
                      scale([1,(extended_height/(extended_thickness*2)),1])    // scale on Y to get height
                        circle(r = extended_thickness, $fn = quality/5);
            }
        }

        cylinder( ring_height+2, inside_radius, inside_radius, $fn = quality, center = true );
    }
    
    
    // Edge decoration added after
    
    // Round
    if (edge_style == 1) {
        translate([0, 0, cyl_height/2])
          rotate_extrude(convexity = 10, $fn = quality)
            translate([inside_radius+(ring_thickness/2), 0, 0])
              circle(r = rounding_radius, $fn = quality/5);
     
        translate([0, 0, -cyl_height/2])
          rotate_extrude(convexity = 10, $fn = quality)
            translate([inside_radius+(ring_thickness/2), 0, 0])
              circle(r = rounding_radius, $fn = quality/5);
    }
    
    // Triangle
    if (edge_style == 2) {
        translate([0, 0, cyl_height/2])
          rotate_extrude(convexity = 10, $fn = quality)
            translate([inside_radius, 0, 0])
              polygon( points=[[0,0],[ring_thickness/2,rounding_radius],[ring_thickness,0]] );
     
        translate([0, 0, -cyl_height/2])
          rotate_extrude(convexity = 10, $fn = quality)
            translate([inside_radius, 0, 0])
              polygon( points=[[0,0],[ring_thickness/2,-rounding_radius],[ring_thickness,0]] );
    }
    
    // Hex
    if (edge_style == 3) {
        translate([0, 0, cyl_height/2])
          rotate_extrude(convexity = 10, $fn = quality)
            translate([inside_radius+(ring_thickness/2), 0, 0])
              circle(r = rounding_radius, $fn = 6);
     
        translate([0, 0, -cyl_height/2])
          rotate_extrude(convexity = 10, $fn = quality)
            translate([inside_radius+(ring_thickness/2), 0, 0])
              circle(r = rounding_radius, $fn = 6);
    }
    
    
}
